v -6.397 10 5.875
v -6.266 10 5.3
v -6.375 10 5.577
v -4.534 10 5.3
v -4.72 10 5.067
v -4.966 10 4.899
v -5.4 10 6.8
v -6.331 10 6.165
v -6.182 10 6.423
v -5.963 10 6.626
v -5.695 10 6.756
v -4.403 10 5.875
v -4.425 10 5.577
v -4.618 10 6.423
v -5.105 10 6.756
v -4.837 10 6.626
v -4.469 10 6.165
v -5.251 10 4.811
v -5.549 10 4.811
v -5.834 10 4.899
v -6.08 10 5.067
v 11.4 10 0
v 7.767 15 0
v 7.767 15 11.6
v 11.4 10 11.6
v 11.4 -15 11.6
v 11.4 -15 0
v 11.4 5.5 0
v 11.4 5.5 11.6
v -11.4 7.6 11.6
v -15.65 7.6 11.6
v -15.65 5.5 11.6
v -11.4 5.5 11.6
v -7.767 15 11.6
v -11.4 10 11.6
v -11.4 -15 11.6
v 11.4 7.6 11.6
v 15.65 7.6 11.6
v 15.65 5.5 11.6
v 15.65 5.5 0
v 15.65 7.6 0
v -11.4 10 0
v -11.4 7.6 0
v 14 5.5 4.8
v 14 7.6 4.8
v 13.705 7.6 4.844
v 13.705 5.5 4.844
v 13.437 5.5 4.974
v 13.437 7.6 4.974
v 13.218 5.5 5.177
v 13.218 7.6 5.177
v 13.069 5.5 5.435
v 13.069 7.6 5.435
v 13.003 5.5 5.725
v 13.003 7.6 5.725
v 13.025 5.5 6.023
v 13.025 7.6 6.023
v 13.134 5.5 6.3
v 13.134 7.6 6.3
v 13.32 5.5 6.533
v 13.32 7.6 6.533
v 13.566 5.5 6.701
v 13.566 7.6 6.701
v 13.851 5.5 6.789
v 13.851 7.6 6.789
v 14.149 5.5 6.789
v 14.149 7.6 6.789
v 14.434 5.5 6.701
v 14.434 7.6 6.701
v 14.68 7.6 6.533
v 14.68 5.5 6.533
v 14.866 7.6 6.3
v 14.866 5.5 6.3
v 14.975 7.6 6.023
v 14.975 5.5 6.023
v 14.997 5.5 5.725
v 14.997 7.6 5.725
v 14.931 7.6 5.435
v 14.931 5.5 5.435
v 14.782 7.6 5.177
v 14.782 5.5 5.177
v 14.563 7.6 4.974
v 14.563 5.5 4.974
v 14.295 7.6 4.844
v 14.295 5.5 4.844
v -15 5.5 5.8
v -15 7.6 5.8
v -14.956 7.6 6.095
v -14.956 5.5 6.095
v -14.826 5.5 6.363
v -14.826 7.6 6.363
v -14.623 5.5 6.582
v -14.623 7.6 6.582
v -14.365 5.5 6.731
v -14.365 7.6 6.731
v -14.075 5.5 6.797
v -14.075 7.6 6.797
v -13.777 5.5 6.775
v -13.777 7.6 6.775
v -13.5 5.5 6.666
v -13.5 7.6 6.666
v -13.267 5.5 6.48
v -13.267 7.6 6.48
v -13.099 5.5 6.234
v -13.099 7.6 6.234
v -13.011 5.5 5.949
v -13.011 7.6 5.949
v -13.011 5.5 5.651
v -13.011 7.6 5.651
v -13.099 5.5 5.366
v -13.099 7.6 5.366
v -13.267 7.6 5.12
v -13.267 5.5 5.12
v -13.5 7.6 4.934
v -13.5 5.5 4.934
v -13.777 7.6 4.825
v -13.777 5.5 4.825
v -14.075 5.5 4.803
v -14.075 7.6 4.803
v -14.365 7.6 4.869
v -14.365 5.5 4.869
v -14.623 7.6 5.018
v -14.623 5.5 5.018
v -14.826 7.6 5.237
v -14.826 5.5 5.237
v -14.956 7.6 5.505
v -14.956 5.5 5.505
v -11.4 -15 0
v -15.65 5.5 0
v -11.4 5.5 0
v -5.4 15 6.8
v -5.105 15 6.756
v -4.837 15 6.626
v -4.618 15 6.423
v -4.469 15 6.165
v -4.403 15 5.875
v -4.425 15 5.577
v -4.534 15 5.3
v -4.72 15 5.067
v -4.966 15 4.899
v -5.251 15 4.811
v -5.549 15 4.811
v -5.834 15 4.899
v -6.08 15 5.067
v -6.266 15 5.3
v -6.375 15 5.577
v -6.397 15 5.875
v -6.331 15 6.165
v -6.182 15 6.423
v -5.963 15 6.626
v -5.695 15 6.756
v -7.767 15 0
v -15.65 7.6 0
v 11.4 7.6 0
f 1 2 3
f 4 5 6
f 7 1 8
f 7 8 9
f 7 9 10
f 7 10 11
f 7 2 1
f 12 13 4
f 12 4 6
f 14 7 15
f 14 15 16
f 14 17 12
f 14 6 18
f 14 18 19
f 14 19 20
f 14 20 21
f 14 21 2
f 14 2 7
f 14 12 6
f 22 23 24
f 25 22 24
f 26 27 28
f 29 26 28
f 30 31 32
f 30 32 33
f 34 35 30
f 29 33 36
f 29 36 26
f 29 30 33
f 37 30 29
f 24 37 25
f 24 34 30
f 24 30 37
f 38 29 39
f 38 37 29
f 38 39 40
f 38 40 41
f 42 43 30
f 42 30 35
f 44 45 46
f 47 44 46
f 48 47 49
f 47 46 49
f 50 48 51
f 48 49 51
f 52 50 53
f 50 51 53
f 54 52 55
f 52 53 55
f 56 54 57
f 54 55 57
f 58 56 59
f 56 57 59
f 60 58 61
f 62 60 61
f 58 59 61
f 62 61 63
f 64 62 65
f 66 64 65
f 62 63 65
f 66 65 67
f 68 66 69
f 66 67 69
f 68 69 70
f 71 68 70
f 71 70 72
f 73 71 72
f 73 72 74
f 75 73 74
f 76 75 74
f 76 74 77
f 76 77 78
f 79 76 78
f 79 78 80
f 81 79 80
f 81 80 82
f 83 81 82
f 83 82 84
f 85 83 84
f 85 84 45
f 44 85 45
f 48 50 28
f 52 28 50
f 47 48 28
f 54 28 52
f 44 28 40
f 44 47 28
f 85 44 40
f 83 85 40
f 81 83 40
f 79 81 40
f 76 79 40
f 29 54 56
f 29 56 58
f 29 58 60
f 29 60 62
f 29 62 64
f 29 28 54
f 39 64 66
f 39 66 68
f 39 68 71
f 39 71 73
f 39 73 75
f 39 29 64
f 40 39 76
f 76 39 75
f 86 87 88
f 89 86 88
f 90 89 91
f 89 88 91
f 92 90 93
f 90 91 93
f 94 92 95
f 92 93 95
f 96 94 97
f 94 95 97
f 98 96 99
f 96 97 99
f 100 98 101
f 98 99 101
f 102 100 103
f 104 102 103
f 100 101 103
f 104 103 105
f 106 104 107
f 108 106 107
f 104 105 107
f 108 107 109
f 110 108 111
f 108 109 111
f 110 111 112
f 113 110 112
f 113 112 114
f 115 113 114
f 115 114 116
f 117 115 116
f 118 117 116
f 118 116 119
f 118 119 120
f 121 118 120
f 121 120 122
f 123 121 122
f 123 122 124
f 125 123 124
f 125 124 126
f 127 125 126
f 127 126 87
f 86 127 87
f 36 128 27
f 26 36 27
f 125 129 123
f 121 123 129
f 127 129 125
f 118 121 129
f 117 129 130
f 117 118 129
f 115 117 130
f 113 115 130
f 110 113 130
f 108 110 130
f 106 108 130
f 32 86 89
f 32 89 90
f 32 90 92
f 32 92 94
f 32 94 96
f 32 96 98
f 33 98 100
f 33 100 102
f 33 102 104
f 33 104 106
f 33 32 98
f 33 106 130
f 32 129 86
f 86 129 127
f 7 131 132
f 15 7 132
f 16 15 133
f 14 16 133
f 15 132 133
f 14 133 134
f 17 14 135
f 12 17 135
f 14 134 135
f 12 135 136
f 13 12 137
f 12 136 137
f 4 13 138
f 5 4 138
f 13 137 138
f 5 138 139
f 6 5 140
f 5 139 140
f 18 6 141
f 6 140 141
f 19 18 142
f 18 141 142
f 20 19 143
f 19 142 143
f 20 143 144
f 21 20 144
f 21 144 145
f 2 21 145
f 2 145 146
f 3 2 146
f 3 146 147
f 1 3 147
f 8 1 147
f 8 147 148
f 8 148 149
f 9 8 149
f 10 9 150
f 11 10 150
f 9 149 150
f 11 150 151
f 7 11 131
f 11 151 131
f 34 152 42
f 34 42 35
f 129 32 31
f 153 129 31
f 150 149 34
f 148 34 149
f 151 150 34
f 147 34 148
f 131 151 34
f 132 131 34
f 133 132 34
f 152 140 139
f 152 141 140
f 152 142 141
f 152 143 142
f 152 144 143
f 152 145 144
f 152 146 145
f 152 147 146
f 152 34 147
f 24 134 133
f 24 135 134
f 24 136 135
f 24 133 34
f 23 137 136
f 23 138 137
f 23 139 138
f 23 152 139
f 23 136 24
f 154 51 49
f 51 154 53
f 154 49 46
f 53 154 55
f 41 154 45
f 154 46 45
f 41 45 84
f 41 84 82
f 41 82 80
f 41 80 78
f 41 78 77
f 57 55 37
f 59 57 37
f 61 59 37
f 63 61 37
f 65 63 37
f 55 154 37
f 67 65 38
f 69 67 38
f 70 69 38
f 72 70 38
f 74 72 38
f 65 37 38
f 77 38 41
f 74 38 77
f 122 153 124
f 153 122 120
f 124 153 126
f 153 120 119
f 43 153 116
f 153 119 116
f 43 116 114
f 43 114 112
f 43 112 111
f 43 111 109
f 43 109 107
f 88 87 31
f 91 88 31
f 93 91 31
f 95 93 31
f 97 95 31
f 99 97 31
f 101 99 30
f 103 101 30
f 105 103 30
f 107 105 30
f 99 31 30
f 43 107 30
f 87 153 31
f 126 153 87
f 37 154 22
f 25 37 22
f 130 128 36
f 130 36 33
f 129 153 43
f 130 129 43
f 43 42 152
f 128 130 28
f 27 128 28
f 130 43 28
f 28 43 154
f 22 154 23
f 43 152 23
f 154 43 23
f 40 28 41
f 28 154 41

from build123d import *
from OCP.BRepFilletAPI import BRepFilletAPI_MakeChamfer

# Parameters (mm, degrees)
SKETCH1_W           = 22.8
SKETCH1_H           = 30
BOSS_EXTRUDE1_DEPTH = 11.6
SKETCH3_W           = 4.25
SKETCH3_H           = 2.1
BOSS_EXTRUDE2_DEPTH = 11.6
SKETCH4_R           = 1
CUT_EXTRUDE1_DEPTH  = 11.6
SKETCH2_R           = 1
CUT_EXTRUDE2_DEPTH  = 5
CHAMFER1_SIZE       = 5
CHAMFER1_SIZE2      = 3.63271264


with BuildPart() as part:
    # Sketch1 → Boss-Extrude1 (new body)
    with BuildSketch(Plane.XY):
        Rectangle(SKETCH1_W, SKETCH1_H)
    extrude(amount=BOSS_EXTRUDE1_DEPTH)

    # Sketch3 → Boss-Extrude2 (add)
    with BuildSketch(Plane.XY.offset(11.6)):
        with Locations((-13.525, 6.55)):
            Rectangle(SKETCH3_W, SKETCH3_H)
        with Locations((13.525, 6.55)):
            Rectangle(SKETCH3_W, SKETCH3_H)
    extrude(amount=-BOSS_EXTRUDE2_DEPTH)

    # Sketch4 → Cut-Extrude1 (cut)
    with BuildSketch(Plane(origin=(0, 7.6, 0), x_dir=(1, 0, 0), z_dir=(0, 1, 0))):
        with Locations(Location((-14, -5.8, 0), (0, 0, 180))):
            Circle(SKETCH4_R)
        with Locations(Location((14, -5.8, 0), (0, 0, 90))):
            Circle(SKETCH4_R)
    extrude(amount=-CUT_EXTRUDE1_DEPTH, mode=Mode.SUBTRACT)

    # Sketch2 → Cut-Extrude2 (cut)
    with BuildSketch(Plane(origin=(0, 15, 0), x_dir=(1, 0, 0), z_dir=(0, 1, 0))):
        with Locations(Location((-5.4, -5.8, 0), (0, 0, 270))):
            Circle(SKETCH2_R)
    extrude(amount=-CUT_EXTRUDE2_DEPTH, mode=Mode.SUBTRACT)

    # Chamfer1: one chamfer whose edges measure the first distance from different faces: ONE call of the kernel's chamfer builder (chamfer() names one face for all edges)
    chamfer1_edges_1 = [part.edges().sort_by_distance(p)[0] for p in [
        (-11.4, 15, 5.8),
    ]]
    chamfer1_side_1 = [part.faces().sort_by_distance(p)[0] for p in [
        (-11.4, 11.3, 5.8),
    ]]
    chamfer1_edges_2 = [part.edges().sort_by_distance(p)[0] for p in [
        (11.4, 15, 5.8),
    ]]
    chamfer1_side_2 = [part.faces().sort_by_distance(p)[0] for p in [
        (11.4, 11.3, 5.8),
    ]]
    chamfer1 = BRepFilletAPI_MakeChamfer(part.part.solid().wrapped)
    for e in chamfer1_edges_1:
        chamfer1.Add(CHAMFER1_SIZE, CHAMFER1_SIZE2, e.wrapped, chamfer1_side_1[0].wrapped)  # the first distance lies on this face
    for e in chamfer1_edges_2:
        chamfer1.Add(CHAMFER1_SIZE, CHAMFER1_SIZE2, e.wrapped, chamfer1_side_2[0].wrapped)  # the first distance lies on this face
    add(Compound.cast(chamfer1.Shape()), mode=Mode.REPLACE)


solid = part.part
